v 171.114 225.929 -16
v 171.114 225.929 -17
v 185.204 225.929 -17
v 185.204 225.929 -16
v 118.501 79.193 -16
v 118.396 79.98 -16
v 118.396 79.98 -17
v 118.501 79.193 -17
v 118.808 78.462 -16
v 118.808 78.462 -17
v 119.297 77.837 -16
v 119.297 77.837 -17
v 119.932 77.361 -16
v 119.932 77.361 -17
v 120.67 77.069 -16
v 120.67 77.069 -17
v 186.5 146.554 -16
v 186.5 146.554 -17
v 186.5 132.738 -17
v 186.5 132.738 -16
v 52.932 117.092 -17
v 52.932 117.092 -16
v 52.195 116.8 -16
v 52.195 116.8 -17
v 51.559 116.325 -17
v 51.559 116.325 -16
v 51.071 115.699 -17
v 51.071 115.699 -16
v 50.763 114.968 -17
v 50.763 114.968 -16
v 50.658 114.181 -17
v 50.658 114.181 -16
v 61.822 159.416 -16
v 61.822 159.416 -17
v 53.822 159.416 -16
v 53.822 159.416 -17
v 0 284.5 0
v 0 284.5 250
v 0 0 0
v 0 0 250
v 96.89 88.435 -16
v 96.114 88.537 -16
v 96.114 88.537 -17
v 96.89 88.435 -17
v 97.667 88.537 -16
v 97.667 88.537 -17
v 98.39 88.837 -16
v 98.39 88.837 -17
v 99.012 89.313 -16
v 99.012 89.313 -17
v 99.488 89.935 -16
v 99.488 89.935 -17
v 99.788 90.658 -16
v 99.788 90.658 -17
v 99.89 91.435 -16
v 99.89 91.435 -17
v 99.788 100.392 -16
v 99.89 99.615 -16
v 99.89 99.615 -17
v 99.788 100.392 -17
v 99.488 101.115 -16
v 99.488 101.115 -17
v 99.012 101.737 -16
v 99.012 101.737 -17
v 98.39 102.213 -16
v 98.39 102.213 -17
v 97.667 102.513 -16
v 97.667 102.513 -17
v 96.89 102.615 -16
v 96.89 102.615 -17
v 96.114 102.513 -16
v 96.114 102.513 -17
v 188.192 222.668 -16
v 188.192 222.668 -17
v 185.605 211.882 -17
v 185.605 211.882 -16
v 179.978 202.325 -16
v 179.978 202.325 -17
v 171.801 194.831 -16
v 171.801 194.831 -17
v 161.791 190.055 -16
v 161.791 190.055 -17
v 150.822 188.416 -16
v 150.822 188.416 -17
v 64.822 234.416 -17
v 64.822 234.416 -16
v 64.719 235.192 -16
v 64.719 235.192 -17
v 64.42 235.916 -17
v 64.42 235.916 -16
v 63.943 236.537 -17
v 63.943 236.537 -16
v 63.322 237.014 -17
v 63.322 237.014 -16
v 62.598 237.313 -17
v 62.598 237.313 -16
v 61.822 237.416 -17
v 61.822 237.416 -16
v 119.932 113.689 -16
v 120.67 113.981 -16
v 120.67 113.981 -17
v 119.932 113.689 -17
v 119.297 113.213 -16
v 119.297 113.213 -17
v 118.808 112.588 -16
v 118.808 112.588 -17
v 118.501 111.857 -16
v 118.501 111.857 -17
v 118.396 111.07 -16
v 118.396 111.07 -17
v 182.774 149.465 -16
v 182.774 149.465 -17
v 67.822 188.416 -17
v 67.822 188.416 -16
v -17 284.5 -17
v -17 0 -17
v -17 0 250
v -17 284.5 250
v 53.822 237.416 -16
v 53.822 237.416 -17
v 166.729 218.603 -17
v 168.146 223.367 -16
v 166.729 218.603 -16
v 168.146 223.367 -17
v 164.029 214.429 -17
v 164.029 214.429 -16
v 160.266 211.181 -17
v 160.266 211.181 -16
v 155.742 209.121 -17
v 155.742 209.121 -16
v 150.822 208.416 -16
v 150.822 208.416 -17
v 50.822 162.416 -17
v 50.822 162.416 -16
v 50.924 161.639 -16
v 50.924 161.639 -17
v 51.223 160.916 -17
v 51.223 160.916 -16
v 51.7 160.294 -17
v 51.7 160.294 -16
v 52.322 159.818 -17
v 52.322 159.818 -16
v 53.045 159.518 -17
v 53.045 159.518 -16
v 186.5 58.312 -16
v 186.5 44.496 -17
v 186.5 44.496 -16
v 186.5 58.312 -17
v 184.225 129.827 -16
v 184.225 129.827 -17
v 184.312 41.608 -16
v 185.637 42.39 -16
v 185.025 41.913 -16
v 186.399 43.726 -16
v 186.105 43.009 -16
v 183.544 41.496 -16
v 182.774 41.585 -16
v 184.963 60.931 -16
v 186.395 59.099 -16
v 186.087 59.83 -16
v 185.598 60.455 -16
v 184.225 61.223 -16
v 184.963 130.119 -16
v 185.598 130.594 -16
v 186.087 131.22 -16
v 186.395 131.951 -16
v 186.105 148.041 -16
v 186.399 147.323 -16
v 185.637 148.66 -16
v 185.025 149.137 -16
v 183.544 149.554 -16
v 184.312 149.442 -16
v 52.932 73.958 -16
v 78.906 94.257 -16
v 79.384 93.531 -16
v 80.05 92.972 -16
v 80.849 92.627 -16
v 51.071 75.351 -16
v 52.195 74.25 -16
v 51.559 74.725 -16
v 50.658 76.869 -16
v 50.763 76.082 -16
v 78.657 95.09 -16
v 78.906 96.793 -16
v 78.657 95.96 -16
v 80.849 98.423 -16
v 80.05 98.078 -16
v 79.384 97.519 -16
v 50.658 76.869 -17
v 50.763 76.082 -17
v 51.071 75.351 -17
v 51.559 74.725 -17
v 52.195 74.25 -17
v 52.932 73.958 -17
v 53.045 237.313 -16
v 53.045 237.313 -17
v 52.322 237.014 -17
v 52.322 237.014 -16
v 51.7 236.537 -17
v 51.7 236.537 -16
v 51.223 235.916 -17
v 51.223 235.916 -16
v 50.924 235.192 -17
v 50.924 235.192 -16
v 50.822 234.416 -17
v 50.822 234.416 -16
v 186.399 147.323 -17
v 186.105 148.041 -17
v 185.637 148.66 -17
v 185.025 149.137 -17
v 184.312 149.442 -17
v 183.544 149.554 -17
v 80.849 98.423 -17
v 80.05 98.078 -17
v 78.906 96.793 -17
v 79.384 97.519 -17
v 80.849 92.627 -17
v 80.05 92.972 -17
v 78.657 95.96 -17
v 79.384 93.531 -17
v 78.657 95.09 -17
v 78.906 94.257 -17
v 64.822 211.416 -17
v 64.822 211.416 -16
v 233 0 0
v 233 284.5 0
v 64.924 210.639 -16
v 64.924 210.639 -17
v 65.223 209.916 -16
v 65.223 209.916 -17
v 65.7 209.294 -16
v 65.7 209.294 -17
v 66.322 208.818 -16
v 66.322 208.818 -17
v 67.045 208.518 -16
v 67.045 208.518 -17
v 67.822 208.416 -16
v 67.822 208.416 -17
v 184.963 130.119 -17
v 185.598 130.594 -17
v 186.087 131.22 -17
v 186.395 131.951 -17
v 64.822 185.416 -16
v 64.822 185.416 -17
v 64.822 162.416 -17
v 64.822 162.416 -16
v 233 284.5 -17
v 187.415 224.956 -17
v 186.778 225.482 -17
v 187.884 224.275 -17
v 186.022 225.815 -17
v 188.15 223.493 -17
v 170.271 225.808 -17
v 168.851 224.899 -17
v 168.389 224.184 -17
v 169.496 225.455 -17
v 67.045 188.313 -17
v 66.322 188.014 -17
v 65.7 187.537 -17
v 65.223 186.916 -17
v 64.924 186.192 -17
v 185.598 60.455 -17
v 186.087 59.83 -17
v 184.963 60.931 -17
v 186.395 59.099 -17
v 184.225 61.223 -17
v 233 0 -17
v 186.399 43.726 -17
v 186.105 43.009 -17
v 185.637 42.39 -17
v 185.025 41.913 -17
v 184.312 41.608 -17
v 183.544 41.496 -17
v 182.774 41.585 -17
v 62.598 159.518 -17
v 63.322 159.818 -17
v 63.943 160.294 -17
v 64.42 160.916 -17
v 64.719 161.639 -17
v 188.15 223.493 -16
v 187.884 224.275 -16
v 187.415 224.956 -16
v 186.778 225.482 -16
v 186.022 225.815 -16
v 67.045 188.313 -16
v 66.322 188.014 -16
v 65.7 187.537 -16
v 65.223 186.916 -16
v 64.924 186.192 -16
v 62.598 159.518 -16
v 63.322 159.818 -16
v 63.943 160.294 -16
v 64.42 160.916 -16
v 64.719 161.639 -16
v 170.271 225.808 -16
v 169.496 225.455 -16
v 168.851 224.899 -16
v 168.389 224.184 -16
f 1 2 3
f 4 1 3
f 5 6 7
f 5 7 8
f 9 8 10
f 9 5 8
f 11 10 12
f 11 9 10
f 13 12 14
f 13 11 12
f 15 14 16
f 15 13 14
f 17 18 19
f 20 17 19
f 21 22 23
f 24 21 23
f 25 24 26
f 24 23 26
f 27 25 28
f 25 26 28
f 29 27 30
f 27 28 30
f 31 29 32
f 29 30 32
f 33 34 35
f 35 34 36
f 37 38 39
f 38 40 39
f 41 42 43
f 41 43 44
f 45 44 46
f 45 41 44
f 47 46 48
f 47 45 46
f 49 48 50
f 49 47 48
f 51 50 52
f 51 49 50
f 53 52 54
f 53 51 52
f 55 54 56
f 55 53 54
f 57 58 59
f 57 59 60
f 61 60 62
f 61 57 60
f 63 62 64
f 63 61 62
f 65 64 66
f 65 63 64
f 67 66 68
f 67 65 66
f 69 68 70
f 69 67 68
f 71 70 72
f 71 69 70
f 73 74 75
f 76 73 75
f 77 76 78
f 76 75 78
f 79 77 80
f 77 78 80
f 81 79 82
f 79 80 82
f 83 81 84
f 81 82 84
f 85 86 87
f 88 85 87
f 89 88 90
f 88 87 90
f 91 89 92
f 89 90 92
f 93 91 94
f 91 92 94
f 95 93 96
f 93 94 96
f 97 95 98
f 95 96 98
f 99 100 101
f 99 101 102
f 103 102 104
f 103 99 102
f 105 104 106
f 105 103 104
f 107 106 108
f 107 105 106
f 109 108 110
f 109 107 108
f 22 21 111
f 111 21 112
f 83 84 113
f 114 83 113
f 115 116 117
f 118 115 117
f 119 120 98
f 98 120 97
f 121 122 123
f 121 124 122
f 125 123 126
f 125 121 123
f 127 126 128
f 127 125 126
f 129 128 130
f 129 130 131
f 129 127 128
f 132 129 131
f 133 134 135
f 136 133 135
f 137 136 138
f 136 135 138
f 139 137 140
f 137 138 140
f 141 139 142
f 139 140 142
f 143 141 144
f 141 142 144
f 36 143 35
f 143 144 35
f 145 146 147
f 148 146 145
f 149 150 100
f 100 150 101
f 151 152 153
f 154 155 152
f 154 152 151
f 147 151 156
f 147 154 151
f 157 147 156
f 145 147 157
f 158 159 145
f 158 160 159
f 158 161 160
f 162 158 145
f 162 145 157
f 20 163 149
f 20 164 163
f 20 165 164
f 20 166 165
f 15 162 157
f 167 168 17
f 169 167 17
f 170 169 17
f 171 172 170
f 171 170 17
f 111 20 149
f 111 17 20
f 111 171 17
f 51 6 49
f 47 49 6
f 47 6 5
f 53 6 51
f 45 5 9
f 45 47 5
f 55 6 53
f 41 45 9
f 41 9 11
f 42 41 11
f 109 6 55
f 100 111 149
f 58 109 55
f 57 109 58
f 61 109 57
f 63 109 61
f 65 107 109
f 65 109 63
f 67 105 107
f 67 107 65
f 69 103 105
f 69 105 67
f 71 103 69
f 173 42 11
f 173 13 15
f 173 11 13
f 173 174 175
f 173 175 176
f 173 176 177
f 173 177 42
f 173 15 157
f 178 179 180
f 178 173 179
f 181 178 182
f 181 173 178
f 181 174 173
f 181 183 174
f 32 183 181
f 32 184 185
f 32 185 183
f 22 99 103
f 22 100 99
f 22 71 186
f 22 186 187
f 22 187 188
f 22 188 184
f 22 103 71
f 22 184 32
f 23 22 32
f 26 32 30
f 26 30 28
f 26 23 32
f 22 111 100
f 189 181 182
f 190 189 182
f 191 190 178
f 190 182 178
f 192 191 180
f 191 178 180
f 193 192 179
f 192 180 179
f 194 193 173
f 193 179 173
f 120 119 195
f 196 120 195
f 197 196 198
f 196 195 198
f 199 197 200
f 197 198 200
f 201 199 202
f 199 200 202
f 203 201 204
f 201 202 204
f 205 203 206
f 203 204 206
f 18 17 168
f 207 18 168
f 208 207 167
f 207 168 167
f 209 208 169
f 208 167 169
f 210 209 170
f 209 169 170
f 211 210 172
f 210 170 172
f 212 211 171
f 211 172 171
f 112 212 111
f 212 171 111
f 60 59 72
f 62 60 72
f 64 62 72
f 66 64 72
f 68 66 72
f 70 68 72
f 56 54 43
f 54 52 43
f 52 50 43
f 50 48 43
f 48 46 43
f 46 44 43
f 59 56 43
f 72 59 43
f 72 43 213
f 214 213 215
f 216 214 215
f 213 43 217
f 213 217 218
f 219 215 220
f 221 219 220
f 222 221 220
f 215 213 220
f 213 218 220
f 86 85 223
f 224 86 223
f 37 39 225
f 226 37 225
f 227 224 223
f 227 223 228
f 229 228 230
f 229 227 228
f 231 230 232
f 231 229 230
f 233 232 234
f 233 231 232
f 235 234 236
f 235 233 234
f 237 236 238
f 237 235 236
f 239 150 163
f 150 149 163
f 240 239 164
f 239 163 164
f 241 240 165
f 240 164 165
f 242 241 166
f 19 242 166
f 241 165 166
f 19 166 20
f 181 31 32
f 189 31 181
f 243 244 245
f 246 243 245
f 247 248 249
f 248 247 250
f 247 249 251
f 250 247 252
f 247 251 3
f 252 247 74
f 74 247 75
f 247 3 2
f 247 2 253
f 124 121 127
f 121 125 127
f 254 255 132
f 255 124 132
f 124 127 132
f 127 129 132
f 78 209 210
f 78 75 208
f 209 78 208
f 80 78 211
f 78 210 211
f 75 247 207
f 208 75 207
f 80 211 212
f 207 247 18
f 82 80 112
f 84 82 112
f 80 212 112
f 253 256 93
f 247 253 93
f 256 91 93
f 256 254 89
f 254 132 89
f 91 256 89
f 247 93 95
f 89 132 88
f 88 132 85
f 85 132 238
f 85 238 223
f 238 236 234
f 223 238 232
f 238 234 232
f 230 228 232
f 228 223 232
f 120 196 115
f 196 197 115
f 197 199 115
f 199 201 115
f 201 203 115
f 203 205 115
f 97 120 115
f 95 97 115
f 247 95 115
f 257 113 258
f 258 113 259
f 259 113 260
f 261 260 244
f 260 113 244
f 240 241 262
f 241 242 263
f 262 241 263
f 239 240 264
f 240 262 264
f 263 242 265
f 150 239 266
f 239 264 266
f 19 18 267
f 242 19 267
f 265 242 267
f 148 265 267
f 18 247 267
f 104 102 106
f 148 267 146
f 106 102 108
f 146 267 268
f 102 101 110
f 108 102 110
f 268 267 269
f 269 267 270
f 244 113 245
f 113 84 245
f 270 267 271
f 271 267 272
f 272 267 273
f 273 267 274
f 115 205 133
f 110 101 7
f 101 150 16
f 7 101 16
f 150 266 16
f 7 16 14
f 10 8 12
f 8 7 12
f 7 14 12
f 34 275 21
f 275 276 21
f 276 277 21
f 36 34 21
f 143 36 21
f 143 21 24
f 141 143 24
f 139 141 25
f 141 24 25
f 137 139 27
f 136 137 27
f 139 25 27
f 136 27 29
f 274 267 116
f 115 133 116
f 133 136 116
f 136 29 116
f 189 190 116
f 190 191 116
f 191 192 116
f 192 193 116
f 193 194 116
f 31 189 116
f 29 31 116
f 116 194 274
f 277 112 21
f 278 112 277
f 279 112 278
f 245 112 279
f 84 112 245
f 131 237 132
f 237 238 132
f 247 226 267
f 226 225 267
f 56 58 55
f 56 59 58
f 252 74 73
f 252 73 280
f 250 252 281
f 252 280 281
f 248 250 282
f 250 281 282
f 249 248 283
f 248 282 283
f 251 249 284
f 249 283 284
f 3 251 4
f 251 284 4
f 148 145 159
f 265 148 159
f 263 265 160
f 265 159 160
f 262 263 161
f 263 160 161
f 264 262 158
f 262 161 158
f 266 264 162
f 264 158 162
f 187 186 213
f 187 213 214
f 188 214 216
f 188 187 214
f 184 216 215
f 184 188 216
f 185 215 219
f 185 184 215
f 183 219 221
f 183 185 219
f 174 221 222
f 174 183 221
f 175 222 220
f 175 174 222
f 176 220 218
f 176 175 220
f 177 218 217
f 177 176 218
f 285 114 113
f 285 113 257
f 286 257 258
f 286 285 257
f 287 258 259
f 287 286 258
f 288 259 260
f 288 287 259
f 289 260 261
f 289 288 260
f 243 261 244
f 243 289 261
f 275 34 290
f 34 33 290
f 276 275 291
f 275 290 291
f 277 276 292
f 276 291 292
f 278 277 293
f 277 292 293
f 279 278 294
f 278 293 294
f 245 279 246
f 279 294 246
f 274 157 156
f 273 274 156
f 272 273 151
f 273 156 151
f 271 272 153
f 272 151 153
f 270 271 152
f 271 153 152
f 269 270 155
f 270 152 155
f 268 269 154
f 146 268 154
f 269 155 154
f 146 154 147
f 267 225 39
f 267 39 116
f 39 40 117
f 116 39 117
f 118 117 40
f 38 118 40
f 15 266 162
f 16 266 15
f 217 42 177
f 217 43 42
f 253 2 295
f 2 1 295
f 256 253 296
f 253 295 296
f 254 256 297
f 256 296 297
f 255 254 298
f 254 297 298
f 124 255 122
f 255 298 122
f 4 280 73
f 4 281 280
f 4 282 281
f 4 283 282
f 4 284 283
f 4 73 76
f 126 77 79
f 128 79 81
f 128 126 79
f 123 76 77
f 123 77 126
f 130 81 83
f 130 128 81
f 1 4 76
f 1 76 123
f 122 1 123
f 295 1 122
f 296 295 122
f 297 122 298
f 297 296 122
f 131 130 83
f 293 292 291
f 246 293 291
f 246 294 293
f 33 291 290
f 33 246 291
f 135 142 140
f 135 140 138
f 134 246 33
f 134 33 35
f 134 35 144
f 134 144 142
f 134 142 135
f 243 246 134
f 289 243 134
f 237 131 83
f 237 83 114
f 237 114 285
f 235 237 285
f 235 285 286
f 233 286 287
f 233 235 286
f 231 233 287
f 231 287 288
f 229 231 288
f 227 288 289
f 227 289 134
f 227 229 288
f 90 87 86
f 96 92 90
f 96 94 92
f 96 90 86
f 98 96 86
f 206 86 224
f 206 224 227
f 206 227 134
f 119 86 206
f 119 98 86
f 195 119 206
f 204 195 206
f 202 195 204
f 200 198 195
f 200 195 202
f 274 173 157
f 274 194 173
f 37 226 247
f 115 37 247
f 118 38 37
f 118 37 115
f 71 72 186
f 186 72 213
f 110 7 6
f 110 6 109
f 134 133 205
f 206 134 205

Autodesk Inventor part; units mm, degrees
ref_plane "YZ Plane" through (0, 0, 0) normal (1, 0, 0) x (0, 1, 0)
ref_plane "XZ Plane" through (0, 0, 0) normal (0, 1, 0) x (-1, 0, 0)
ref_plane "XY Plane" through (0, 0, 0) normal (0, 0, 1) x (1, 0, 0)
sketch "Sketch1" plane through (0, 0, 0) normal (0, 1, 0) x (-1, 0, 0)
  line L0 (17, 250) -> (0, 250)
  line L1 (0, 250) -> (0, 0)
  line L2 (0, 0) -> (17, 0)
  line L3 (17, 0) -> (17, 250)
  line L4 (17, 0) -> (-233, 0)
  line L5 (-233, 0) -> (-233, -17)
  line L6 (-233, -17) -> (17, -17)
  line L7 (17, -17) -> (17, 0)
  dimension "d0" = 17
  dimension "d1" = 250
  dimension "d2" = 250
extrude "Extrusion1" add sketch "Sketch1" along normal blind 284.5
sketch "Sketch2" plane through (233, 0, -17) normal (0, 0, -1) x (-1, 0, 0)
  line L0 (0, 0) -> (250, 0) projected
  line L1 (250, 0) -> (250, 284.5) projected
  line L2 (0, 284.5) -> (250, 284.5) projected
  line L3 (0, 0) -> (0, 284.5) projected
  line L4 (182.1785, 237.4156) -> (168.1785, 237.4156)
  line L5 (168.1785, 237.4156) -> (168.1785, 159.4156)
  line L6 (168.1785, 159.4156) -> (182.1785, 159.4156)
  line L7 (182.1785, 159.4156) -> (182.1785, 237.4156)
  line L8 (168.1785, 208.4156) -> (82.1785, 208.4156)
  line L9 (82.1785, 208.4156) -> (82.1785, 188.4156)
  line L10 (82.1785, 188.4156) -> (168.1785, 188.4156)
  line L11 (168.1785, 188.4156) -> (168.1785, 208.4156)
  arc A0 (64.6656, 225.9286) -> (82.1785, 208.4156) centre (82.1785, 225.9286) ccw
  line L12 (82.1785, 225.9286) -> (64.6656, 225.9286) construction
  line L13 (82.1785, 225.9286) -> (82.1785, 208.4156) construction
  arc A1 (44.6656, 225.9286) -> (82.1785, 188.4156) centre (82.1785, 225.9286) ccw
  line L14 (64.6656, 225.9286) -> (44.6656, 225.9286)
  line L15 (182.3419, 116.525) -> (46.5005, 150.394)
  line L16 (46.5005, 150.394) -> (46.5005, 130.394)
  line L17 (46.5005, 130.394) -> (114.6042, 113.4139)
  line L18 (133.1096, 95.525) -> (133.1096, 103.525)
  line L19 (133.1096, 103.525) -> (163.0533, 95.5016)
  line L20 (114.6042, 113.4139) -> (114.6042, 93.4139)
  line L21 (182.3419, 116.525) -> (182.3419, 95.525)
  line L22 (133.1096, 95.525) -> (42.0362, 95.525)
  line L23 (182.3419, 74.525) -> (46.5005, 40.6559)
  line L24 (46.5005, 40.6559) -> (46.5005, 60.6559)
  line L25 (46.5005, 60.6559) -> (114.6042, 77.6361)
  line L26 (133.1096, 95.525) -> (133.1096, 87.525)
  line L27 (133.1096, 87.525) -> (163.0533, 95.5484)
  line L28 (114.6042, 77.6361) -> (114.6042, 97.6361)
  line L29 (182.3419, 74.525) -> (182.3419, 95.525)
  point P0 (233, 0)
  point P1 (162.966, 95.525)
  dimension "d5" = 90
  dimension "d6" = 21
  dimension "d7" = 140
  dimension "d8" = 20
  dimension "d9" = 20
  dimension "d10" = 8
  dimension "d11" = 31
  dimension "d12" = 68.1037
  dimension "d13" = 78
  dimension "d14" = 20
  dimension "d15" = 29
  dimension "d16" = 14
  dimension "d18" = 86
  dimension "d19" = 75
  dimension "d20" = 76
extrude "Extrusion2" cut sketch "Sketch2" against normal blind 1 contours L7 L6 L5 L4 | L5 L10 L9 L8 | L9 A1 L14 A0 | L21 L29 L23 L24 L25 L28 L20 L17 L16 L15
fillet "Fillet1" radius 3 19 edges at (50.6581, 116.525, -16.5) (99.8904, 87.525, -16.5) (99.8904, 103.525, -16.5) (70.034, 95.525, -16.5) (50.6581, 74.525, -16.5) (50.8215, 159.4156, -16.5) (64.8215, 188.4156, -16.5) (118.3958, 113.4139, -16.5) (118.3958, 77.6361, -16.5) (186.4995, 40.6559, -16.5) (186.4995, 60.6559, -16.5) (186.4995, 130.394, -16.5) (186.4995, 150.394, -16.5) (168.3344, 225.9286, -16.5) (188.3344, 225.9286, -16.5) (64.8215, 237.4156, -16.5) (50.8215, 237.4156, -16.5) (64.8215, 159.4156, -16.5) (64.8215, 208.4156, -16.5)
equation "\"d15\" = 0.5 * d13 - 0.5 * d14"
properties part number "TableroEscrito"
